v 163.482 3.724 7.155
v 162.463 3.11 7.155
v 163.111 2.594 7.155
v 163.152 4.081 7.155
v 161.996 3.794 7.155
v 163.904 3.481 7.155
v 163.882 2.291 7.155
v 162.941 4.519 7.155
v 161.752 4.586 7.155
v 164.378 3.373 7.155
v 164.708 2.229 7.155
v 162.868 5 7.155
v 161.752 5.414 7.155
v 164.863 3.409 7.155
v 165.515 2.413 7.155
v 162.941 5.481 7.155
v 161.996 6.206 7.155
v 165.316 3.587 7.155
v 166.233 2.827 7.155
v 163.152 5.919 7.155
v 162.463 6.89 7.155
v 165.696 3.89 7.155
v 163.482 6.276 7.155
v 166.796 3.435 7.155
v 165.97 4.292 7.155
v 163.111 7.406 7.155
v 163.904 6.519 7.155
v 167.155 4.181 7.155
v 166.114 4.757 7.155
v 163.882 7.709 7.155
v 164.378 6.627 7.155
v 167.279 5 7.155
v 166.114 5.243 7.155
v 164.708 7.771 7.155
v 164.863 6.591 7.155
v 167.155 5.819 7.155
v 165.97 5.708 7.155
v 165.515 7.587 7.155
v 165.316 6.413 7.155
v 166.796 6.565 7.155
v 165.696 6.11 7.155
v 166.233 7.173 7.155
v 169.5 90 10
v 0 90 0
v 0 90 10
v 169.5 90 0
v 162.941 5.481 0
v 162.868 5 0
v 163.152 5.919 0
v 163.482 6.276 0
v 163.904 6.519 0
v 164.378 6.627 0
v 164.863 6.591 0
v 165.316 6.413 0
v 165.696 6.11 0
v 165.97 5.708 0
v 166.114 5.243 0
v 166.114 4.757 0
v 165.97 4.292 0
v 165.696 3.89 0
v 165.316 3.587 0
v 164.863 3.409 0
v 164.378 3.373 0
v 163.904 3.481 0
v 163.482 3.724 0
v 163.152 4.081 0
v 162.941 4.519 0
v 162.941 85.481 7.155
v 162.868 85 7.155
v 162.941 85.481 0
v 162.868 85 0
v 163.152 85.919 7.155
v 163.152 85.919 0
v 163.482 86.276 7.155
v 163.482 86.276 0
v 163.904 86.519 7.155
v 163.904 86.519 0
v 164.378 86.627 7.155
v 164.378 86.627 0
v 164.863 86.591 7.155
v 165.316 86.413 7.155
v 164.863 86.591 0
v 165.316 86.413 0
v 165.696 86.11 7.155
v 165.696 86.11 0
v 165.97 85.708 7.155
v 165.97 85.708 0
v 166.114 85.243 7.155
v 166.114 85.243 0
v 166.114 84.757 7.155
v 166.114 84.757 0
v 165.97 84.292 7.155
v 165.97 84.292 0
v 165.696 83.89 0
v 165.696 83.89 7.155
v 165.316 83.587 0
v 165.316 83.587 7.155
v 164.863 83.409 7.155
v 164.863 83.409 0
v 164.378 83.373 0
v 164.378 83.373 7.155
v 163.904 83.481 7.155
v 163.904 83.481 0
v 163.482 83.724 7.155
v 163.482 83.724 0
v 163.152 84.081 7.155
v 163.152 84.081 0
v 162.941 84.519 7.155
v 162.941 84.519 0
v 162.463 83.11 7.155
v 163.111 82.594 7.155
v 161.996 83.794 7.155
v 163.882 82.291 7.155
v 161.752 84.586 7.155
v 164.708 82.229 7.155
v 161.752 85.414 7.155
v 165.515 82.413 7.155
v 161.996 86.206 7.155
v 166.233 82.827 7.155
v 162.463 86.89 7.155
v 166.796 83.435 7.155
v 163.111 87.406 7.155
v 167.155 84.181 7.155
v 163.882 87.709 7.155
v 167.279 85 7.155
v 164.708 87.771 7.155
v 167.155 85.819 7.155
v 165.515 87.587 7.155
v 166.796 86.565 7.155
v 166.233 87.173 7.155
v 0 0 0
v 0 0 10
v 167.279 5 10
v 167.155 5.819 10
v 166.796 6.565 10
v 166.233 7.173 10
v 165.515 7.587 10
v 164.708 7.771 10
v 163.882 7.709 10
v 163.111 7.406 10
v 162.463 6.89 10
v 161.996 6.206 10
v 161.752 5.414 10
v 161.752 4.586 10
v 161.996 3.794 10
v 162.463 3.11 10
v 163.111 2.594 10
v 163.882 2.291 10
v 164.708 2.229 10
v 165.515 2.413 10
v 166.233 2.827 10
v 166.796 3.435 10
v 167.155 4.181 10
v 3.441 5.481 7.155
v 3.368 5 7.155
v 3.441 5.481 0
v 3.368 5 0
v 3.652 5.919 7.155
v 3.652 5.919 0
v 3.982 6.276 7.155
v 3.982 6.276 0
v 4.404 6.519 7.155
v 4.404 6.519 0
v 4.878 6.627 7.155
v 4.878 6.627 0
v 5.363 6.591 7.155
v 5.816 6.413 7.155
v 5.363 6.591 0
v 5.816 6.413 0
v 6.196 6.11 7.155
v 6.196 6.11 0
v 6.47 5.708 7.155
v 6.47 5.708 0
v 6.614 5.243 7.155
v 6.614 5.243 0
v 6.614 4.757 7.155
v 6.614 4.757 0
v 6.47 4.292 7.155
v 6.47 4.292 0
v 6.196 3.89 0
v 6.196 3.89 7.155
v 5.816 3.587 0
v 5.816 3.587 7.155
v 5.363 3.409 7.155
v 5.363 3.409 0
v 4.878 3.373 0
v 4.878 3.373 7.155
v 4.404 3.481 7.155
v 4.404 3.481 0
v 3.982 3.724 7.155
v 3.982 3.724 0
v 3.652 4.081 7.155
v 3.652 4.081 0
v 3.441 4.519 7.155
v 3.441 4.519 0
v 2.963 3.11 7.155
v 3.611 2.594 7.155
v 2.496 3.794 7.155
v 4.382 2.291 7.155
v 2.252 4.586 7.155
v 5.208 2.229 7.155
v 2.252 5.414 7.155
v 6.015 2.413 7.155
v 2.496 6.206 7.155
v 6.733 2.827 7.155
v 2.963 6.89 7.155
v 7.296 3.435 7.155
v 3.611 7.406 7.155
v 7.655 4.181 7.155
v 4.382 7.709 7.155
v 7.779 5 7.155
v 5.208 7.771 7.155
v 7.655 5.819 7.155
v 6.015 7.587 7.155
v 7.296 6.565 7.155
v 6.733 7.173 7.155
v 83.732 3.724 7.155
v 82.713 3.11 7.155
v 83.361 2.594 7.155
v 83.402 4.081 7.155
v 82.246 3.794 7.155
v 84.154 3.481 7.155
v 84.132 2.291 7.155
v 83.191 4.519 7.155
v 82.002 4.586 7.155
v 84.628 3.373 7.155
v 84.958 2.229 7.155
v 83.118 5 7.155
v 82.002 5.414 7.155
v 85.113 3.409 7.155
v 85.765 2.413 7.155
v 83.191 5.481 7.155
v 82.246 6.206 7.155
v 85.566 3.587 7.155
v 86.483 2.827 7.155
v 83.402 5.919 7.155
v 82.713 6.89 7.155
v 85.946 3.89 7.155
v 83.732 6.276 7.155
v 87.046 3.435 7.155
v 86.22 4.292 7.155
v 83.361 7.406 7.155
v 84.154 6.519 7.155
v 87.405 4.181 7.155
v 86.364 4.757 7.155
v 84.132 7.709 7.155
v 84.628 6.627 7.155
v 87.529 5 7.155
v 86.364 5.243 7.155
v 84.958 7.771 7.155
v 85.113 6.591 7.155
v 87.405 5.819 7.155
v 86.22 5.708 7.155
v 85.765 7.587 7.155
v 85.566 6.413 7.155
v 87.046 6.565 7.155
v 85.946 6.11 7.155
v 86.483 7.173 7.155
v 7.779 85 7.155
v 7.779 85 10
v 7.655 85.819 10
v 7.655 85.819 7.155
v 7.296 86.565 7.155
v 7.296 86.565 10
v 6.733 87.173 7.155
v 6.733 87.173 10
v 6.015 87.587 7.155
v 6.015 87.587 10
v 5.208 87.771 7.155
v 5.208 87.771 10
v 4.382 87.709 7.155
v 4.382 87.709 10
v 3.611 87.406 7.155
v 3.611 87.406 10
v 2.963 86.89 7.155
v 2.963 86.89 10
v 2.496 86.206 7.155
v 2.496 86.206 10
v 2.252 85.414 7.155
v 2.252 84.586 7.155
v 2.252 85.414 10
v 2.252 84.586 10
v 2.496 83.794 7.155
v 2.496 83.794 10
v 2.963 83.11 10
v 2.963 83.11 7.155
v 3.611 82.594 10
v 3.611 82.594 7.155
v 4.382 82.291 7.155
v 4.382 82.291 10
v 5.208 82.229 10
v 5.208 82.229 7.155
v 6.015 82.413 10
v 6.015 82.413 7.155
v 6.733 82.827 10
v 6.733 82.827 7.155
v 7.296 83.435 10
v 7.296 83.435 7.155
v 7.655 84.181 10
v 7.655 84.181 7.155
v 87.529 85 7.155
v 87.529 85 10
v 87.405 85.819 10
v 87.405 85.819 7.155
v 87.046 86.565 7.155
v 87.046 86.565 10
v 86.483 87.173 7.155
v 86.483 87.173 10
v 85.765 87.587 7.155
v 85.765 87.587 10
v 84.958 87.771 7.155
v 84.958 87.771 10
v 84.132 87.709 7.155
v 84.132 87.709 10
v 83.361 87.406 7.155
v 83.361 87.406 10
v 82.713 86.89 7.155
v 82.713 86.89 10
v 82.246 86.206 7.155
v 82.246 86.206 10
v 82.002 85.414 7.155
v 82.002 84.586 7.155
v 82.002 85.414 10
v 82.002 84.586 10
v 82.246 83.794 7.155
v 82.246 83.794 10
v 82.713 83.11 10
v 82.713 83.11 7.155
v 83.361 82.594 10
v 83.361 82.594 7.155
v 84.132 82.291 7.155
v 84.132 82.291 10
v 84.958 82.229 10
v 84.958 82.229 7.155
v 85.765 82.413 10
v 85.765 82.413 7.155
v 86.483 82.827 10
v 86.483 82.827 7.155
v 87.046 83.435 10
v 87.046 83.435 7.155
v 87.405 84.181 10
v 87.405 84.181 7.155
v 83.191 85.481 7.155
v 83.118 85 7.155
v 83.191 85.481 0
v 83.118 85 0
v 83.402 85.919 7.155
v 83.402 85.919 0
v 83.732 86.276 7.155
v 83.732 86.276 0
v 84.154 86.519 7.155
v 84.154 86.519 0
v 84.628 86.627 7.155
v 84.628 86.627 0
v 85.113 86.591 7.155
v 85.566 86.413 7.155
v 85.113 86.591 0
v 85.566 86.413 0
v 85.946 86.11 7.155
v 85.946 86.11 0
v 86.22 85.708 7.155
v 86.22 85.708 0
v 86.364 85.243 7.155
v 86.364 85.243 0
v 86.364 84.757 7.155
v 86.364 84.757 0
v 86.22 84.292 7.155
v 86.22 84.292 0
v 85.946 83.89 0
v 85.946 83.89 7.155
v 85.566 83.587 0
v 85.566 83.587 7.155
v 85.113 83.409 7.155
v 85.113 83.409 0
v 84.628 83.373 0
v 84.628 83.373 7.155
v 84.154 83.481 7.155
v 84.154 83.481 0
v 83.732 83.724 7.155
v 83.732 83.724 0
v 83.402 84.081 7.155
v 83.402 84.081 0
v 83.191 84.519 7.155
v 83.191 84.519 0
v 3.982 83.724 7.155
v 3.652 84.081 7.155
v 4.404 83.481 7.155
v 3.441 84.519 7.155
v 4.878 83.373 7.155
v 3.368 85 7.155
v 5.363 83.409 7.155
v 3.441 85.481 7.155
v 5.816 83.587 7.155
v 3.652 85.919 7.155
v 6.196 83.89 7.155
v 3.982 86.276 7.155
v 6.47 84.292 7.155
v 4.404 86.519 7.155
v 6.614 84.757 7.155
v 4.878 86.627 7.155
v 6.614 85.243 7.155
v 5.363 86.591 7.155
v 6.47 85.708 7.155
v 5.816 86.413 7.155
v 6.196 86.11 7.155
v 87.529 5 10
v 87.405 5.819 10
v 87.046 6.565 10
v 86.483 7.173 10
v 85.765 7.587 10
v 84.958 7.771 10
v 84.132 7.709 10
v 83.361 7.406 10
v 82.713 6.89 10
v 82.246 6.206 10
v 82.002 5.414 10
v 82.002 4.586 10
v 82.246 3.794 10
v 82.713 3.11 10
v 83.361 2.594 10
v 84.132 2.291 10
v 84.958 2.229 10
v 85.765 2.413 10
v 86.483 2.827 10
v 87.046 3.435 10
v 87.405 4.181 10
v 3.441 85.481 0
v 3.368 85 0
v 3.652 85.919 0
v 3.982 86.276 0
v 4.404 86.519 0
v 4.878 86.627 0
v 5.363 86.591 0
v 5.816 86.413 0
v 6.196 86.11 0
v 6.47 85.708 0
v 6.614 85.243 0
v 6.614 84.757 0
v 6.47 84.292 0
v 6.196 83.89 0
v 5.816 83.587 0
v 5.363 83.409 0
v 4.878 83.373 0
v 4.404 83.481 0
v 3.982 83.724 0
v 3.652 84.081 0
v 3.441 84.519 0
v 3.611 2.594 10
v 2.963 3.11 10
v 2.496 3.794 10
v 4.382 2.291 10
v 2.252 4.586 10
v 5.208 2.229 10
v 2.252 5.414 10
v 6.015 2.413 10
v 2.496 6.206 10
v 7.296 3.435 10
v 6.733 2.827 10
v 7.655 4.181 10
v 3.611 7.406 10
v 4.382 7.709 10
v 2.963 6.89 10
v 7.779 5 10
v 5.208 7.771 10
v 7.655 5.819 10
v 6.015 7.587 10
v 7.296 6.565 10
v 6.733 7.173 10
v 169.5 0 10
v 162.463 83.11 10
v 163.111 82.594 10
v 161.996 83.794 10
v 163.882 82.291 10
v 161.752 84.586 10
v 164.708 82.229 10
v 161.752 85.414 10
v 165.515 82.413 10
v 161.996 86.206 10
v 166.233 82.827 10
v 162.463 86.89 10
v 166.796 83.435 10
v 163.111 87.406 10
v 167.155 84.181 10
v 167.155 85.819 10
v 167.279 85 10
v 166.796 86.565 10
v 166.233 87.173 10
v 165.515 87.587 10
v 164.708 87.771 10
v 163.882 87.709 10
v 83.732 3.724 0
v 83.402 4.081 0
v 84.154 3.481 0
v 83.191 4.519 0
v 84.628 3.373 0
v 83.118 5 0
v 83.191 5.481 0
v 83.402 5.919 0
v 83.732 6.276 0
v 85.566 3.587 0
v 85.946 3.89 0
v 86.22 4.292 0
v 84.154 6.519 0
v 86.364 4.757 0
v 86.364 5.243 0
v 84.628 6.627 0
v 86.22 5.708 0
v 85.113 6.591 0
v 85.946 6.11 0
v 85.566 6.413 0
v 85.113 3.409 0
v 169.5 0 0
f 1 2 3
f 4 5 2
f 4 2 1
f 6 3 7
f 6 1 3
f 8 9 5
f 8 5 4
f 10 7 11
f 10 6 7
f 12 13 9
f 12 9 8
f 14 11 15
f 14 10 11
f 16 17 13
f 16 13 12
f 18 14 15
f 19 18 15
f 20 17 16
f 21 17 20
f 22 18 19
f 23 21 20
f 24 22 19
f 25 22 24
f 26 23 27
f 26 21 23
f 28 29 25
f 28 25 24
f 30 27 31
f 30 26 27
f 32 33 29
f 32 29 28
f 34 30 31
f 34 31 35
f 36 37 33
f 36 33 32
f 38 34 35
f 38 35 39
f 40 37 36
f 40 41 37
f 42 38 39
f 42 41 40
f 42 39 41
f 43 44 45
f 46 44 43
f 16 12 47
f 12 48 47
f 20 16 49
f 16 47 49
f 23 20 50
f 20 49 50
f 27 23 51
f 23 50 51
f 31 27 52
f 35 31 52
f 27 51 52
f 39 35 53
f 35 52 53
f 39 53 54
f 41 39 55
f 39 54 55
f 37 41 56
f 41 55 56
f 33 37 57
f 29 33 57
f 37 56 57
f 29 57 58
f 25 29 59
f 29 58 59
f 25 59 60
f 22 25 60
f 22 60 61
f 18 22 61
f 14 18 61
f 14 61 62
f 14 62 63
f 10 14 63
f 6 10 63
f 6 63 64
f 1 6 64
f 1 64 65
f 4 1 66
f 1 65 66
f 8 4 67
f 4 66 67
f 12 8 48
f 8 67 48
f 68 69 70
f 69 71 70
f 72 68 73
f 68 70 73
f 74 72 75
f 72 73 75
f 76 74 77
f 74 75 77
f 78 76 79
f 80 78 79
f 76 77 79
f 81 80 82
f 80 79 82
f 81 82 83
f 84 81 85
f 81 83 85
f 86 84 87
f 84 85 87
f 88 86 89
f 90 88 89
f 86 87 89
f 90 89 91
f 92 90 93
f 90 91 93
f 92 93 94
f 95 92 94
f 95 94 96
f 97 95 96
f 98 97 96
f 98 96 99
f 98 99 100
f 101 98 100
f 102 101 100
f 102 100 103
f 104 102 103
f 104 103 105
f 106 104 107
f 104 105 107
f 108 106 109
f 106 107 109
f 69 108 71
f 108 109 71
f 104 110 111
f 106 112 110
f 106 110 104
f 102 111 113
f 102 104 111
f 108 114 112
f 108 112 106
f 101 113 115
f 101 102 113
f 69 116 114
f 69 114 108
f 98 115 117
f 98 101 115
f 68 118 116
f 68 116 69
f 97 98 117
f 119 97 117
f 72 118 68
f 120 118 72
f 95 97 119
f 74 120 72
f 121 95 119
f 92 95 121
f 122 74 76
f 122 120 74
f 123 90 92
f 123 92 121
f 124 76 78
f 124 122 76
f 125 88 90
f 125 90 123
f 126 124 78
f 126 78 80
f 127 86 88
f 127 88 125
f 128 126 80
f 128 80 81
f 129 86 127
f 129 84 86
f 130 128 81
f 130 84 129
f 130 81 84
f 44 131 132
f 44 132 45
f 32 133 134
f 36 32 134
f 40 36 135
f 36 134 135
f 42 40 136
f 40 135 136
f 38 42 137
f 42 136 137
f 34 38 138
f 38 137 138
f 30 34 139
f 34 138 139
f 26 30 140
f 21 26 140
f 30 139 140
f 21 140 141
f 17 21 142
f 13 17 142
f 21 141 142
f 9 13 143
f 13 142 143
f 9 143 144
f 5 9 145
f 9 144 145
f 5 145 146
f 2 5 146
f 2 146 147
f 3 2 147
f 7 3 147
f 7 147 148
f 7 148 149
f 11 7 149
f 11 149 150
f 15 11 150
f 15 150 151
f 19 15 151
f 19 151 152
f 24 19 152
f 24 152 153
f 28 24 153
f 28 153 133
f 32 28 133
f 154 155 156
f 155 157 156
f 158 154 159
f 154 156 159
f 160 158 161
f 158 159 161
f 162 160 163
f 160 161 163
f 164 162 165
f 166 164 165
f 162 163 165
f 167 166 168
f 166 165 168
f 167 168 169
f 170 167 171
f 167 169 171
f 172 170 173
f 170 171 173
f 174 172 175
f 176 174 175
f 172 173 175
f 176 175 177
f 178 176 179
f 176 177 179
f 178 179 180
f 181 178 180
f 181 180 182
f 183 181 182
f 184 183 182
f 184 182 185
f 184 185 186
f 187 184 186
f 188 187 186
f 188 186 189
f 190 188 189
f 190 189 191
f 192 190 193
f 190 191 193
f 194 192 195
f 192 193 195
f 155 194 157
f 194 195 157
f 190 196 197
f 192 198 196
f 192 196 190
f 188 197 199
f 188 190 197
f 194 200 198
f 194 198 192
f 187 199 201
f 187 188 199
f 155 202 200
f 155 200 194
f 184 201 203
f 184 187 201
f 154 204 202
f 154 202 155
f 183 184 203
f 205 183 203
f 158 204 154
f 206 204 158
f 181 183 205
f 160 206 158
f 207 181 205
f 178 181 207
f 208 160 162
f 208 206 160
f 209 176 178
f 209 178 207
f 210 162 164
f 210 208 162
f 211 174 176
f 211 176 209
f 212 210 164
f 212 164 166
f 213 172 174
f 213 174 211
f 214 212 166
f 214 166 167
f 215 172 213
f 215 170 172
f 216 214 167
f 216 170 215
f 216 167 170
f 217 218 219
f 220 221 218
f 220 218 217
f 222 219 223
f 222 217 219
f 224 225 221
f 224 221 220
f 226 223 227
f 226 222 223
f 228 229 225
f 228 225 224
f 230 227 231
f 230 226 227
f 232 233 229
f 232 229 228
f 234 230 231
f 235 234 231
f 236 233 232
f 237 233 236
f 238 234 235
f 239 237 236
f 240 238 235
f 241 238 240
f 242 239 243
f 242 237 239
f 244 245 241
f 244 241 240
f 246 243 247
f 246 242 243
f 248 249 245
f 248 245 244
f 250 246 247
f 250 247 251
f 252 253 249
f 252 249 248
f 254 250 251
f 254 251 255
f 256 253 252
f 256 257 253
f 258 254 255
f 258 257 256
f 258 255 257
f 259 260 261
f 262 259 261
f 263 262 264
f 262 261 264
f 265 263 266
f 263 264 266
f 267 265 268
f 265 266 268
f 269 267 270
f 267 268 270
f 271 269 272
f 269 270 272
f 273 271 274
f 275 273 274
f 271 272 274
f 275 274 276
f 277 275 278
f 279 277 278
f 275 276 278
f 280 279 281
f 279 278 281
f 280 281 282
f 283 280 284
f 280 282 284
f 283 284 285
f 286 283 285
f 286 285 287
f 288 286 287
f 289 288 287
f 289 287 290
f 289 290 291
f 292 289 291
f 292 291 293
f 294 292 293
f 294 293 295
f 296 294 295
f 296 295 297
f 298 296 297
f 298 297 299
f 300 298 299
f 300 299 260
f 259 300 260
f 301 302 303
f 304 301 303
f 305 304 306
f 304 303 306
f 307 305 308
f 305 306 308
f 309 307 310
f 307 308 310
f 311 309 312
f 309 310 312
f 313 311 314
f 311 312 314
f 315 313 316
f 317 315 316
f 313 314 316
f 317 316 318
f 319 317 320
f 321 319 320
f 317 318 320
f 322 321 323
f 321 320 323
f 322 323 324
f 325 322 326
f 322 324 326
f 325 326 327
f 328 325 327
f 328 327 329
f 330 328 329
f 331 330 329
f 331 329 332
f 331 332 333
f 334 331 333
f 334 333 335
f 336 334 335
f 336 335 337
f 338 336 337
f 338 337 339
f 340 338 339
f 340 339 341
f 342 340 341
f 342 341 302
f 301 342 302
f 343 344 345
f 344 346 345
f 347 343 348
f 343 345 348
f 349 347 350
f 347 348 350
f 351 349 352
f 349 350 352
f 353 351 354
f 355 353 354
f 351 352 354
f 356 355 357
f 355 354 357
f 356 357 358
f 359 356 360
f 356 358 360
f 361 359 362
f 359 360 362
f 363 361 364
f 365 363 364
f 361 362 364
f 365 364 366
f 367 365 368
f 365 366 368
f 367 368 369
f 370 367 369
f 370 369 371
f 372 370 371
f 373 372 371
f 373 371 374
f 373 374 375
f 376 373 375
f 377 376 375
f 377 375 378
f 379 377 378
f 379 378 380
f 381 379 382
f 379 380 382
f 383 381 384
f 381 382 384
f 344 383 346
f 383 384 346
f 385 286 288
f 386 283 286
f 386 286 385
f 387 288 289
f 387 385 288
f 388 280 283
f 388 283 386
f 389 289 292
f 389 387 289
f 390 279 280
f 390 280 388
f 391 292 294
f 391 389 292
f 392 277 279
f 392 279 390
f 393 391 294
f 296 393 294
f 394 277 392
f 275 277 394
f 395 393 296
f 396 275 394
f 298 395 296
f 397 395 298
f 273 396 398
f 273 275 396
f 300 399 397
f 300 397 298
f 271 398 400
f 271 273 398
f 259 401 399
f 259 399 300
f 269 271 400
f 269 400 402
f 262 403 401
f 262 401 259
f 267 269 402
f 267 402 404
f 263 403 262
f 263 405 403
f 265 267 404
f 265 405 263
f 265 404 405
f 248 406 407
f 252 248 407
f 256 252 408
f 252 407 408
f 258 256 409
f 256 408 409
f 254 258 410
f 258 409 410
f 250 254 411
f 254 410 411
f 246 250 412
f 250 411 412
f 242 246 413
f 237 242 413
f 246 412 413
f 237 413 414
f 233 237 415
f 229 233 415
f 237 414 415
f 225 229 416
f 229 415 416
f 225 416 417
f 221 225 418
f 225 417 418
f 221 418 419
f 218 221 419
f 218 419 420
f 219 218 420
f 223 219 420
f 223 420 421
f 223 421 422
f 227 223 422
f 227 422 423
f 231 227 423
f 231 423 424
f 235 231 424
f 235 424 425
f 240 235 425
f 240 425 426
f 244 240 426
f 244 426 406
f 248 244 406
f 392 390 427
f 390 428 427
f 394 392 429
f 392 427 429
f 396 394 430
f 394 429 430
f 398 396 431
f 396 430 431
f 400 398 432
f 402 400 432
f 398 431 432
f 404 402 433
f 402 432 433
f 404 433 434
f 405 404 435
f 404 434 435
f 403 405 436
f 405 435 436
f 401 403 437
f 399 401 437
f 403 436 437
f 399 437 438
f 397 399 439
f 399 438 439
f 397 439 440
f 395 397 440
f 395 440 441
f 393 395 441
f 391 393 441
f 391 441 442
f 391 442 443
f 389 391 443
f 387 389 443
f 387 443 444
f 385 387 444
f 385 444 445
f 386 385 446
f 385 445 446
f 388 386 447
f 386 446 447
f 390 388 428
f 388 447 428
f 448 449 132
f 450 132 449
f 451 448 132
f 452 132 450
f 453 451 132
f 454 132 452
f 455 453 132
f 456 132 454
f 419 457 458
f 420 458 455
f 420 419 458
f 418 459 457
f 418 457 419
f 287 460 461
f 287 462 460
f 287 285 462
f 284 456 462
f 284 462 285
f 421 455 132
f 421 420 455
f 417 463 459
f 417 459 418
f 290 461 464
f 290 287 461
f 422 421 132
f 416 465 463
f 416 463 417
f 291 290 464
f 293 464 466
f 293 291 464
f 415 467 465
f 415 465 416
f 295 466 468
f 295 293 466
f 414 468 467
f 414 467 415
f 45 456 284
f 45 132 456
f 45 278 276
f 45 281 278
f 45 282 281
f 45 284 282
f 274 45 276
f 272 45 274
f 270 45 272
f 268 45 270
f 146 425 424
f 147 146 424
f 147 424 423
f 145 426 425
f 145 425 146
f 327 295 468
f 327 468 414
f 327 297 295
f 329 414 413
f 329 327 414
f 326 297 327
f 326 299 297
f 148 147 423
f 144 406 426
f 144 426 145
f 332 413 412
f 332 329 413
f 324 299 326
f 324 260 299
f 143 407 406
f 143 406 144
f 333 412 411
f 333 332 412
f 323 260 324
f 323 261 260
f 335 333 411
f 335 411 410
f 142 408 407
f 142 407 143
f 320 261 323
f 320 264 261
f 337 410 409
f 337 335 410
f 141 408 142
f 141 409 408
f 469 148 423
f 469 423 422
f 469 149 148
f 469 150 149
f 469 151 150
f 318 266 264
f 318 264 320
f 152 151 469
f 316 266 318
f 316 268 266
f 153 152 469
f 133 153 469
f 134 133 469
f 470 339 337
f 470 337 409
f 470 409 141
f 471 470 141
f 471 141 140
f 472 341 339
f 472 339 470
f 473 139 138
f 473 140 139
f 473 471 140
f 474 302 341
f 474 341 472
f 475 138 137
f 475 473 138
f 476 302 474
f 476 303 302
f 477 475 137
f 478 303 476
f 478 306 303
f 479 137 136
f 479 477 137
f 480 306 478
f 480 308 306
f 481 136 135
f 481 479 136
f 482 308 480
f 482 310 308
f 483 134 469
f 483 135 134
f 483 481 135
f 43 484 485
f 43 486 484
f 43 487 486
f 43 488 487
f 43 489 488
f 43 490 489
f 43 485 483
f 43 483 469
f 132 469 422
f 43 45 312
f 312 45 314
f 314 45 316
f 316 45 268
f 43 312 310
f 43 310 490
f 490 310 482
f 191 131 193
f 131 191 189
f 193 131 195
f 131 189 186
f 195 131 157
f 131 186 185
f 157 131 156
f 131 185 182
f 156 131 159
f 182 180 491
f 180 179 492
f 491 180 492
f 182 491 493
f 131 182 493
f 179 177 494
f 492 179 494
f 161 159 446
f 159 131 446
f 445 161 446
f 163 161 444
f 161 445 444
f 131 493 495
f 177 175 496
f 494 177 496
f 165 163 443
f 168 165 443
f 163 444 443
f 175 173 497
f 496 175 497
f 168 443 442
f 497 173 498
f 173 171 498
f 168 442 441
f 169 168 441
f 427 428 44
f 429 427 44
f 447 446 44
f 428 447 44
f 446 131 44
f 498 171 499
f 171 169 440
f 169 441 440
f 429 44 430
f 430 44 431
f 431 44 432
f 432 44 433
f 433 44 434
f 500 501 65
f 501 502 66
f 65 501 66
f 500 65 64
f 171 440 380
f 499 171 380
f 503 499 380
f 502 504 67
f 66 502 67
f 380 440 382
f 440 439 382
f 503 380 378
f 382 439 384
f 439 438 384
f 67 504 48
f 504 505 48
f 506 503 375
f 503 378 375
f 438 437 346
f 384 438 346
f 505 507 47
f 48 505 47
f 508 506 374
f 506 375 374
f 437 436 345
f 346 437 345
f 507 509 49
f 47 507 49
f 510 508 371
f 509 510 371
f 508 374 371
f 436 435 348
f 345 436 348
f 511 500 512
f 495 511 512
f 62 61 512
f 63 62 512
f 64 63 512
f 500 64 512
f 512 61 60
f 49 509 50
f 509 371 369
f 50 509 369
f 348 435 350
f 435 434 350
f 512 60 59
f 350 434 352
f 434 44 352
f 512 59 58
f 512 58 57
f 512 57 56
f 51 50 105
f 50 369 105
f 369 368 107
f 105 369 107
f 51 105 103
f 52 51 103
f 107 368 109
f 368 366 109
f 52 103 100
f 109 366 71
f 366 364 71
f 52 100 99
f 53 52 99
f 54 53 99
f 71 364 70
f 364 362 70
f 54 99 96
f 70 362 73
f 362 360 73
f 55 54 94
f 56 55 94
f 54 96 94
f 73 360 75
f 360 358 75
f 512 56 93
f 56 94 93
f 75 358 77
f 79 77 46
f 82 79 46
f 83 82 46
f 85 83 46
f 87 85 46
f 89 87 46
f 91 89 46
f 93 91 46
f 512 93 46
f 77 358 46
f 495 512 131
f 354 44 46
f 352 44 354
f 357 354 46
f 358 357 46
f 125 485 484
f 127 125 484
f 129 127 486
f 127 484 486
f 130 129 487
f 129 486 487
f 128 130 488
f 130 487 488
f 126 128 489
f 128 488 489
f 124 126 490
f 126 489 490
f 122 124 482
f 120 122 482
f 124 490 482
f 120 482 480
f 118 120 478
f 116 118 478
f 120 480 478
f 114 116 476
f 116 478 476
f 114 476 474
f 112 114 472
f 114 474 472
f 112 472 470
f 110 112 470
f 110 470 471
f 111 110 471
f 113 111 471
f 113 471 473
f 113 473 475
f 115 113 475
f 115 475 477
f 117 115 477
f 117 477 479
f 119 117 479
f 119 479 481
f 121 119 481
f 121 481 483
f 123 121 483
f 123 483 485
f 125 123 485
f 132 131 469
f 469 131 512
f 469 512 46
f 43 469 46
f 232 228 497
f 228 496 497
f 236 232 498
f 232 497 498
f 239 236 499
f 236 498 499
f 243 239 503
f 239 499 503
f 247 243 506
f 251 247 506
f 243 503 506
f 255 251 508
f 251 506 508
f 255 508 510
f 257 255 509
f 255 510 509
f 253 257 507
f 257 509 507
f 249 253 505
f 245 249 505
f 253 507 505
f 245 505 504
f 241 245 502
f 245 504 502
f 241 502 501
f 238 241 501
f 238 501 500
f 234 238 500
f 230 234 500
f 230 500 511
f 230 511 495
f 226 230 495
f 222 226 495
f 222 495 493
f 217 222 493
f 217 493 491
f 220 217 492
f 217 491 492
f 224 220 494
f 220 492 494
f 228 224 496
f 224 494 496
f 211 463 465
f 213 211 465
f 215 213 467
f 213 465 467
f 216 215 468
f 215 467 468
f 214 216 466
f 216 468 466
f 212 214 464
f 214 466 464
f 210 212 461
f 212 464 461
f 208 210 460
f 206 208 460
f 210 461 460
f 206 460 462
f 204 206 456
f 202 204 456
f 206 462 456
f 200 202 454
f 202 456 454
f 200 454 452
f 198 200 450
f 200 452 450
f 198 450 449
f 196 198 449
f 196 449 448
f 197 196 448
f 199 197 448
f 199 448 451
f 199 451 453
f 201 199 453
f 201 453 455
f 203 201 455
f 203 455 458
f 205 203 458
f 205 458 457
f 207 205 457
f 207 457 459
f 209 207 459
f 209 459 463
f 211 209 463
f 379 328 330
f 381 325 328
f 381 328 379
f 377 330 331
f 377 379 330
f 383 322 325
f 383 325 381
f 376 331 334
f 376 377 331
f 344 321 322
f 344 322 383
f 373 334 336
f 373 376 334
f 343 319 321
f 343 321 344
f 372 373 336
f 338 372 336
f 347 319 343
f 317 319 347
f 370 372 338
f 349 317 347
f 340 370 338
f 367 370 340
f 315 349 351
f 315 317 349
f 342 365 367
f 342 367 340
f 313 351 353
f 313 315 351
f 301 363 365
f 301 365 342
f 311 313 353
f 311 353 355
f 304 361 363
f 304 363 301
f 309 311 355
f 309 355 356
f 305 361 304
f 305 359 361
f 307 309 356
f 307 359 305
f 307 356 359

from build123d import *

# Parameters (mm, degrees)
SKETCH1_W                                      = 169.5
SKETCH1_H                                      = 90
BOSS_EXTRUDE1_DEPTH                            = 10
CBORE_FOR_4_SOCKET_HEAD_CAP_SCREW1_D           = 3.2639
CBORE_FOR_4_SOCKET_HEAD_CAP_SCREW1_CBORE_D     = 5.55752
CBORE_FOR_4_SOCKET_HEAD_CAP_SCREW1_CBORE_DEPTH = 2.8448


with BuildPart() as part:
    # Sketch1 → Boss-Extrude1 (new body)
    with BuildSketch(Plane.XY):
        with Locations((84.75, 45)):
            Rectangle(SKETCH1_W, SKETCH1_H)
    extrude(amount=BOSS_EXTRUDE1_DEPTH)

    # CBORE for #4 Socket Head Cap Screw1 (through all)
    with Locations(Plane.XY.offset(10)):
        with Locations((5, 85), (164.5, 85), (164.5, 5), (5, 5), (84.75, 5), (84.75, 85)):
            CounterBoreHole(CBORE_FOR_4_SOCKET_HEAD_CAP_SCREW1_D / 2, CBORE_FOR_4_SOCKET_HEAD_CAP_SCREW1_CBORE_D / 2, CBORE_FOR_4_SOCKET_HEAD_CAP_SCREW1_CBORE_DEPTH)


solid = part.part
